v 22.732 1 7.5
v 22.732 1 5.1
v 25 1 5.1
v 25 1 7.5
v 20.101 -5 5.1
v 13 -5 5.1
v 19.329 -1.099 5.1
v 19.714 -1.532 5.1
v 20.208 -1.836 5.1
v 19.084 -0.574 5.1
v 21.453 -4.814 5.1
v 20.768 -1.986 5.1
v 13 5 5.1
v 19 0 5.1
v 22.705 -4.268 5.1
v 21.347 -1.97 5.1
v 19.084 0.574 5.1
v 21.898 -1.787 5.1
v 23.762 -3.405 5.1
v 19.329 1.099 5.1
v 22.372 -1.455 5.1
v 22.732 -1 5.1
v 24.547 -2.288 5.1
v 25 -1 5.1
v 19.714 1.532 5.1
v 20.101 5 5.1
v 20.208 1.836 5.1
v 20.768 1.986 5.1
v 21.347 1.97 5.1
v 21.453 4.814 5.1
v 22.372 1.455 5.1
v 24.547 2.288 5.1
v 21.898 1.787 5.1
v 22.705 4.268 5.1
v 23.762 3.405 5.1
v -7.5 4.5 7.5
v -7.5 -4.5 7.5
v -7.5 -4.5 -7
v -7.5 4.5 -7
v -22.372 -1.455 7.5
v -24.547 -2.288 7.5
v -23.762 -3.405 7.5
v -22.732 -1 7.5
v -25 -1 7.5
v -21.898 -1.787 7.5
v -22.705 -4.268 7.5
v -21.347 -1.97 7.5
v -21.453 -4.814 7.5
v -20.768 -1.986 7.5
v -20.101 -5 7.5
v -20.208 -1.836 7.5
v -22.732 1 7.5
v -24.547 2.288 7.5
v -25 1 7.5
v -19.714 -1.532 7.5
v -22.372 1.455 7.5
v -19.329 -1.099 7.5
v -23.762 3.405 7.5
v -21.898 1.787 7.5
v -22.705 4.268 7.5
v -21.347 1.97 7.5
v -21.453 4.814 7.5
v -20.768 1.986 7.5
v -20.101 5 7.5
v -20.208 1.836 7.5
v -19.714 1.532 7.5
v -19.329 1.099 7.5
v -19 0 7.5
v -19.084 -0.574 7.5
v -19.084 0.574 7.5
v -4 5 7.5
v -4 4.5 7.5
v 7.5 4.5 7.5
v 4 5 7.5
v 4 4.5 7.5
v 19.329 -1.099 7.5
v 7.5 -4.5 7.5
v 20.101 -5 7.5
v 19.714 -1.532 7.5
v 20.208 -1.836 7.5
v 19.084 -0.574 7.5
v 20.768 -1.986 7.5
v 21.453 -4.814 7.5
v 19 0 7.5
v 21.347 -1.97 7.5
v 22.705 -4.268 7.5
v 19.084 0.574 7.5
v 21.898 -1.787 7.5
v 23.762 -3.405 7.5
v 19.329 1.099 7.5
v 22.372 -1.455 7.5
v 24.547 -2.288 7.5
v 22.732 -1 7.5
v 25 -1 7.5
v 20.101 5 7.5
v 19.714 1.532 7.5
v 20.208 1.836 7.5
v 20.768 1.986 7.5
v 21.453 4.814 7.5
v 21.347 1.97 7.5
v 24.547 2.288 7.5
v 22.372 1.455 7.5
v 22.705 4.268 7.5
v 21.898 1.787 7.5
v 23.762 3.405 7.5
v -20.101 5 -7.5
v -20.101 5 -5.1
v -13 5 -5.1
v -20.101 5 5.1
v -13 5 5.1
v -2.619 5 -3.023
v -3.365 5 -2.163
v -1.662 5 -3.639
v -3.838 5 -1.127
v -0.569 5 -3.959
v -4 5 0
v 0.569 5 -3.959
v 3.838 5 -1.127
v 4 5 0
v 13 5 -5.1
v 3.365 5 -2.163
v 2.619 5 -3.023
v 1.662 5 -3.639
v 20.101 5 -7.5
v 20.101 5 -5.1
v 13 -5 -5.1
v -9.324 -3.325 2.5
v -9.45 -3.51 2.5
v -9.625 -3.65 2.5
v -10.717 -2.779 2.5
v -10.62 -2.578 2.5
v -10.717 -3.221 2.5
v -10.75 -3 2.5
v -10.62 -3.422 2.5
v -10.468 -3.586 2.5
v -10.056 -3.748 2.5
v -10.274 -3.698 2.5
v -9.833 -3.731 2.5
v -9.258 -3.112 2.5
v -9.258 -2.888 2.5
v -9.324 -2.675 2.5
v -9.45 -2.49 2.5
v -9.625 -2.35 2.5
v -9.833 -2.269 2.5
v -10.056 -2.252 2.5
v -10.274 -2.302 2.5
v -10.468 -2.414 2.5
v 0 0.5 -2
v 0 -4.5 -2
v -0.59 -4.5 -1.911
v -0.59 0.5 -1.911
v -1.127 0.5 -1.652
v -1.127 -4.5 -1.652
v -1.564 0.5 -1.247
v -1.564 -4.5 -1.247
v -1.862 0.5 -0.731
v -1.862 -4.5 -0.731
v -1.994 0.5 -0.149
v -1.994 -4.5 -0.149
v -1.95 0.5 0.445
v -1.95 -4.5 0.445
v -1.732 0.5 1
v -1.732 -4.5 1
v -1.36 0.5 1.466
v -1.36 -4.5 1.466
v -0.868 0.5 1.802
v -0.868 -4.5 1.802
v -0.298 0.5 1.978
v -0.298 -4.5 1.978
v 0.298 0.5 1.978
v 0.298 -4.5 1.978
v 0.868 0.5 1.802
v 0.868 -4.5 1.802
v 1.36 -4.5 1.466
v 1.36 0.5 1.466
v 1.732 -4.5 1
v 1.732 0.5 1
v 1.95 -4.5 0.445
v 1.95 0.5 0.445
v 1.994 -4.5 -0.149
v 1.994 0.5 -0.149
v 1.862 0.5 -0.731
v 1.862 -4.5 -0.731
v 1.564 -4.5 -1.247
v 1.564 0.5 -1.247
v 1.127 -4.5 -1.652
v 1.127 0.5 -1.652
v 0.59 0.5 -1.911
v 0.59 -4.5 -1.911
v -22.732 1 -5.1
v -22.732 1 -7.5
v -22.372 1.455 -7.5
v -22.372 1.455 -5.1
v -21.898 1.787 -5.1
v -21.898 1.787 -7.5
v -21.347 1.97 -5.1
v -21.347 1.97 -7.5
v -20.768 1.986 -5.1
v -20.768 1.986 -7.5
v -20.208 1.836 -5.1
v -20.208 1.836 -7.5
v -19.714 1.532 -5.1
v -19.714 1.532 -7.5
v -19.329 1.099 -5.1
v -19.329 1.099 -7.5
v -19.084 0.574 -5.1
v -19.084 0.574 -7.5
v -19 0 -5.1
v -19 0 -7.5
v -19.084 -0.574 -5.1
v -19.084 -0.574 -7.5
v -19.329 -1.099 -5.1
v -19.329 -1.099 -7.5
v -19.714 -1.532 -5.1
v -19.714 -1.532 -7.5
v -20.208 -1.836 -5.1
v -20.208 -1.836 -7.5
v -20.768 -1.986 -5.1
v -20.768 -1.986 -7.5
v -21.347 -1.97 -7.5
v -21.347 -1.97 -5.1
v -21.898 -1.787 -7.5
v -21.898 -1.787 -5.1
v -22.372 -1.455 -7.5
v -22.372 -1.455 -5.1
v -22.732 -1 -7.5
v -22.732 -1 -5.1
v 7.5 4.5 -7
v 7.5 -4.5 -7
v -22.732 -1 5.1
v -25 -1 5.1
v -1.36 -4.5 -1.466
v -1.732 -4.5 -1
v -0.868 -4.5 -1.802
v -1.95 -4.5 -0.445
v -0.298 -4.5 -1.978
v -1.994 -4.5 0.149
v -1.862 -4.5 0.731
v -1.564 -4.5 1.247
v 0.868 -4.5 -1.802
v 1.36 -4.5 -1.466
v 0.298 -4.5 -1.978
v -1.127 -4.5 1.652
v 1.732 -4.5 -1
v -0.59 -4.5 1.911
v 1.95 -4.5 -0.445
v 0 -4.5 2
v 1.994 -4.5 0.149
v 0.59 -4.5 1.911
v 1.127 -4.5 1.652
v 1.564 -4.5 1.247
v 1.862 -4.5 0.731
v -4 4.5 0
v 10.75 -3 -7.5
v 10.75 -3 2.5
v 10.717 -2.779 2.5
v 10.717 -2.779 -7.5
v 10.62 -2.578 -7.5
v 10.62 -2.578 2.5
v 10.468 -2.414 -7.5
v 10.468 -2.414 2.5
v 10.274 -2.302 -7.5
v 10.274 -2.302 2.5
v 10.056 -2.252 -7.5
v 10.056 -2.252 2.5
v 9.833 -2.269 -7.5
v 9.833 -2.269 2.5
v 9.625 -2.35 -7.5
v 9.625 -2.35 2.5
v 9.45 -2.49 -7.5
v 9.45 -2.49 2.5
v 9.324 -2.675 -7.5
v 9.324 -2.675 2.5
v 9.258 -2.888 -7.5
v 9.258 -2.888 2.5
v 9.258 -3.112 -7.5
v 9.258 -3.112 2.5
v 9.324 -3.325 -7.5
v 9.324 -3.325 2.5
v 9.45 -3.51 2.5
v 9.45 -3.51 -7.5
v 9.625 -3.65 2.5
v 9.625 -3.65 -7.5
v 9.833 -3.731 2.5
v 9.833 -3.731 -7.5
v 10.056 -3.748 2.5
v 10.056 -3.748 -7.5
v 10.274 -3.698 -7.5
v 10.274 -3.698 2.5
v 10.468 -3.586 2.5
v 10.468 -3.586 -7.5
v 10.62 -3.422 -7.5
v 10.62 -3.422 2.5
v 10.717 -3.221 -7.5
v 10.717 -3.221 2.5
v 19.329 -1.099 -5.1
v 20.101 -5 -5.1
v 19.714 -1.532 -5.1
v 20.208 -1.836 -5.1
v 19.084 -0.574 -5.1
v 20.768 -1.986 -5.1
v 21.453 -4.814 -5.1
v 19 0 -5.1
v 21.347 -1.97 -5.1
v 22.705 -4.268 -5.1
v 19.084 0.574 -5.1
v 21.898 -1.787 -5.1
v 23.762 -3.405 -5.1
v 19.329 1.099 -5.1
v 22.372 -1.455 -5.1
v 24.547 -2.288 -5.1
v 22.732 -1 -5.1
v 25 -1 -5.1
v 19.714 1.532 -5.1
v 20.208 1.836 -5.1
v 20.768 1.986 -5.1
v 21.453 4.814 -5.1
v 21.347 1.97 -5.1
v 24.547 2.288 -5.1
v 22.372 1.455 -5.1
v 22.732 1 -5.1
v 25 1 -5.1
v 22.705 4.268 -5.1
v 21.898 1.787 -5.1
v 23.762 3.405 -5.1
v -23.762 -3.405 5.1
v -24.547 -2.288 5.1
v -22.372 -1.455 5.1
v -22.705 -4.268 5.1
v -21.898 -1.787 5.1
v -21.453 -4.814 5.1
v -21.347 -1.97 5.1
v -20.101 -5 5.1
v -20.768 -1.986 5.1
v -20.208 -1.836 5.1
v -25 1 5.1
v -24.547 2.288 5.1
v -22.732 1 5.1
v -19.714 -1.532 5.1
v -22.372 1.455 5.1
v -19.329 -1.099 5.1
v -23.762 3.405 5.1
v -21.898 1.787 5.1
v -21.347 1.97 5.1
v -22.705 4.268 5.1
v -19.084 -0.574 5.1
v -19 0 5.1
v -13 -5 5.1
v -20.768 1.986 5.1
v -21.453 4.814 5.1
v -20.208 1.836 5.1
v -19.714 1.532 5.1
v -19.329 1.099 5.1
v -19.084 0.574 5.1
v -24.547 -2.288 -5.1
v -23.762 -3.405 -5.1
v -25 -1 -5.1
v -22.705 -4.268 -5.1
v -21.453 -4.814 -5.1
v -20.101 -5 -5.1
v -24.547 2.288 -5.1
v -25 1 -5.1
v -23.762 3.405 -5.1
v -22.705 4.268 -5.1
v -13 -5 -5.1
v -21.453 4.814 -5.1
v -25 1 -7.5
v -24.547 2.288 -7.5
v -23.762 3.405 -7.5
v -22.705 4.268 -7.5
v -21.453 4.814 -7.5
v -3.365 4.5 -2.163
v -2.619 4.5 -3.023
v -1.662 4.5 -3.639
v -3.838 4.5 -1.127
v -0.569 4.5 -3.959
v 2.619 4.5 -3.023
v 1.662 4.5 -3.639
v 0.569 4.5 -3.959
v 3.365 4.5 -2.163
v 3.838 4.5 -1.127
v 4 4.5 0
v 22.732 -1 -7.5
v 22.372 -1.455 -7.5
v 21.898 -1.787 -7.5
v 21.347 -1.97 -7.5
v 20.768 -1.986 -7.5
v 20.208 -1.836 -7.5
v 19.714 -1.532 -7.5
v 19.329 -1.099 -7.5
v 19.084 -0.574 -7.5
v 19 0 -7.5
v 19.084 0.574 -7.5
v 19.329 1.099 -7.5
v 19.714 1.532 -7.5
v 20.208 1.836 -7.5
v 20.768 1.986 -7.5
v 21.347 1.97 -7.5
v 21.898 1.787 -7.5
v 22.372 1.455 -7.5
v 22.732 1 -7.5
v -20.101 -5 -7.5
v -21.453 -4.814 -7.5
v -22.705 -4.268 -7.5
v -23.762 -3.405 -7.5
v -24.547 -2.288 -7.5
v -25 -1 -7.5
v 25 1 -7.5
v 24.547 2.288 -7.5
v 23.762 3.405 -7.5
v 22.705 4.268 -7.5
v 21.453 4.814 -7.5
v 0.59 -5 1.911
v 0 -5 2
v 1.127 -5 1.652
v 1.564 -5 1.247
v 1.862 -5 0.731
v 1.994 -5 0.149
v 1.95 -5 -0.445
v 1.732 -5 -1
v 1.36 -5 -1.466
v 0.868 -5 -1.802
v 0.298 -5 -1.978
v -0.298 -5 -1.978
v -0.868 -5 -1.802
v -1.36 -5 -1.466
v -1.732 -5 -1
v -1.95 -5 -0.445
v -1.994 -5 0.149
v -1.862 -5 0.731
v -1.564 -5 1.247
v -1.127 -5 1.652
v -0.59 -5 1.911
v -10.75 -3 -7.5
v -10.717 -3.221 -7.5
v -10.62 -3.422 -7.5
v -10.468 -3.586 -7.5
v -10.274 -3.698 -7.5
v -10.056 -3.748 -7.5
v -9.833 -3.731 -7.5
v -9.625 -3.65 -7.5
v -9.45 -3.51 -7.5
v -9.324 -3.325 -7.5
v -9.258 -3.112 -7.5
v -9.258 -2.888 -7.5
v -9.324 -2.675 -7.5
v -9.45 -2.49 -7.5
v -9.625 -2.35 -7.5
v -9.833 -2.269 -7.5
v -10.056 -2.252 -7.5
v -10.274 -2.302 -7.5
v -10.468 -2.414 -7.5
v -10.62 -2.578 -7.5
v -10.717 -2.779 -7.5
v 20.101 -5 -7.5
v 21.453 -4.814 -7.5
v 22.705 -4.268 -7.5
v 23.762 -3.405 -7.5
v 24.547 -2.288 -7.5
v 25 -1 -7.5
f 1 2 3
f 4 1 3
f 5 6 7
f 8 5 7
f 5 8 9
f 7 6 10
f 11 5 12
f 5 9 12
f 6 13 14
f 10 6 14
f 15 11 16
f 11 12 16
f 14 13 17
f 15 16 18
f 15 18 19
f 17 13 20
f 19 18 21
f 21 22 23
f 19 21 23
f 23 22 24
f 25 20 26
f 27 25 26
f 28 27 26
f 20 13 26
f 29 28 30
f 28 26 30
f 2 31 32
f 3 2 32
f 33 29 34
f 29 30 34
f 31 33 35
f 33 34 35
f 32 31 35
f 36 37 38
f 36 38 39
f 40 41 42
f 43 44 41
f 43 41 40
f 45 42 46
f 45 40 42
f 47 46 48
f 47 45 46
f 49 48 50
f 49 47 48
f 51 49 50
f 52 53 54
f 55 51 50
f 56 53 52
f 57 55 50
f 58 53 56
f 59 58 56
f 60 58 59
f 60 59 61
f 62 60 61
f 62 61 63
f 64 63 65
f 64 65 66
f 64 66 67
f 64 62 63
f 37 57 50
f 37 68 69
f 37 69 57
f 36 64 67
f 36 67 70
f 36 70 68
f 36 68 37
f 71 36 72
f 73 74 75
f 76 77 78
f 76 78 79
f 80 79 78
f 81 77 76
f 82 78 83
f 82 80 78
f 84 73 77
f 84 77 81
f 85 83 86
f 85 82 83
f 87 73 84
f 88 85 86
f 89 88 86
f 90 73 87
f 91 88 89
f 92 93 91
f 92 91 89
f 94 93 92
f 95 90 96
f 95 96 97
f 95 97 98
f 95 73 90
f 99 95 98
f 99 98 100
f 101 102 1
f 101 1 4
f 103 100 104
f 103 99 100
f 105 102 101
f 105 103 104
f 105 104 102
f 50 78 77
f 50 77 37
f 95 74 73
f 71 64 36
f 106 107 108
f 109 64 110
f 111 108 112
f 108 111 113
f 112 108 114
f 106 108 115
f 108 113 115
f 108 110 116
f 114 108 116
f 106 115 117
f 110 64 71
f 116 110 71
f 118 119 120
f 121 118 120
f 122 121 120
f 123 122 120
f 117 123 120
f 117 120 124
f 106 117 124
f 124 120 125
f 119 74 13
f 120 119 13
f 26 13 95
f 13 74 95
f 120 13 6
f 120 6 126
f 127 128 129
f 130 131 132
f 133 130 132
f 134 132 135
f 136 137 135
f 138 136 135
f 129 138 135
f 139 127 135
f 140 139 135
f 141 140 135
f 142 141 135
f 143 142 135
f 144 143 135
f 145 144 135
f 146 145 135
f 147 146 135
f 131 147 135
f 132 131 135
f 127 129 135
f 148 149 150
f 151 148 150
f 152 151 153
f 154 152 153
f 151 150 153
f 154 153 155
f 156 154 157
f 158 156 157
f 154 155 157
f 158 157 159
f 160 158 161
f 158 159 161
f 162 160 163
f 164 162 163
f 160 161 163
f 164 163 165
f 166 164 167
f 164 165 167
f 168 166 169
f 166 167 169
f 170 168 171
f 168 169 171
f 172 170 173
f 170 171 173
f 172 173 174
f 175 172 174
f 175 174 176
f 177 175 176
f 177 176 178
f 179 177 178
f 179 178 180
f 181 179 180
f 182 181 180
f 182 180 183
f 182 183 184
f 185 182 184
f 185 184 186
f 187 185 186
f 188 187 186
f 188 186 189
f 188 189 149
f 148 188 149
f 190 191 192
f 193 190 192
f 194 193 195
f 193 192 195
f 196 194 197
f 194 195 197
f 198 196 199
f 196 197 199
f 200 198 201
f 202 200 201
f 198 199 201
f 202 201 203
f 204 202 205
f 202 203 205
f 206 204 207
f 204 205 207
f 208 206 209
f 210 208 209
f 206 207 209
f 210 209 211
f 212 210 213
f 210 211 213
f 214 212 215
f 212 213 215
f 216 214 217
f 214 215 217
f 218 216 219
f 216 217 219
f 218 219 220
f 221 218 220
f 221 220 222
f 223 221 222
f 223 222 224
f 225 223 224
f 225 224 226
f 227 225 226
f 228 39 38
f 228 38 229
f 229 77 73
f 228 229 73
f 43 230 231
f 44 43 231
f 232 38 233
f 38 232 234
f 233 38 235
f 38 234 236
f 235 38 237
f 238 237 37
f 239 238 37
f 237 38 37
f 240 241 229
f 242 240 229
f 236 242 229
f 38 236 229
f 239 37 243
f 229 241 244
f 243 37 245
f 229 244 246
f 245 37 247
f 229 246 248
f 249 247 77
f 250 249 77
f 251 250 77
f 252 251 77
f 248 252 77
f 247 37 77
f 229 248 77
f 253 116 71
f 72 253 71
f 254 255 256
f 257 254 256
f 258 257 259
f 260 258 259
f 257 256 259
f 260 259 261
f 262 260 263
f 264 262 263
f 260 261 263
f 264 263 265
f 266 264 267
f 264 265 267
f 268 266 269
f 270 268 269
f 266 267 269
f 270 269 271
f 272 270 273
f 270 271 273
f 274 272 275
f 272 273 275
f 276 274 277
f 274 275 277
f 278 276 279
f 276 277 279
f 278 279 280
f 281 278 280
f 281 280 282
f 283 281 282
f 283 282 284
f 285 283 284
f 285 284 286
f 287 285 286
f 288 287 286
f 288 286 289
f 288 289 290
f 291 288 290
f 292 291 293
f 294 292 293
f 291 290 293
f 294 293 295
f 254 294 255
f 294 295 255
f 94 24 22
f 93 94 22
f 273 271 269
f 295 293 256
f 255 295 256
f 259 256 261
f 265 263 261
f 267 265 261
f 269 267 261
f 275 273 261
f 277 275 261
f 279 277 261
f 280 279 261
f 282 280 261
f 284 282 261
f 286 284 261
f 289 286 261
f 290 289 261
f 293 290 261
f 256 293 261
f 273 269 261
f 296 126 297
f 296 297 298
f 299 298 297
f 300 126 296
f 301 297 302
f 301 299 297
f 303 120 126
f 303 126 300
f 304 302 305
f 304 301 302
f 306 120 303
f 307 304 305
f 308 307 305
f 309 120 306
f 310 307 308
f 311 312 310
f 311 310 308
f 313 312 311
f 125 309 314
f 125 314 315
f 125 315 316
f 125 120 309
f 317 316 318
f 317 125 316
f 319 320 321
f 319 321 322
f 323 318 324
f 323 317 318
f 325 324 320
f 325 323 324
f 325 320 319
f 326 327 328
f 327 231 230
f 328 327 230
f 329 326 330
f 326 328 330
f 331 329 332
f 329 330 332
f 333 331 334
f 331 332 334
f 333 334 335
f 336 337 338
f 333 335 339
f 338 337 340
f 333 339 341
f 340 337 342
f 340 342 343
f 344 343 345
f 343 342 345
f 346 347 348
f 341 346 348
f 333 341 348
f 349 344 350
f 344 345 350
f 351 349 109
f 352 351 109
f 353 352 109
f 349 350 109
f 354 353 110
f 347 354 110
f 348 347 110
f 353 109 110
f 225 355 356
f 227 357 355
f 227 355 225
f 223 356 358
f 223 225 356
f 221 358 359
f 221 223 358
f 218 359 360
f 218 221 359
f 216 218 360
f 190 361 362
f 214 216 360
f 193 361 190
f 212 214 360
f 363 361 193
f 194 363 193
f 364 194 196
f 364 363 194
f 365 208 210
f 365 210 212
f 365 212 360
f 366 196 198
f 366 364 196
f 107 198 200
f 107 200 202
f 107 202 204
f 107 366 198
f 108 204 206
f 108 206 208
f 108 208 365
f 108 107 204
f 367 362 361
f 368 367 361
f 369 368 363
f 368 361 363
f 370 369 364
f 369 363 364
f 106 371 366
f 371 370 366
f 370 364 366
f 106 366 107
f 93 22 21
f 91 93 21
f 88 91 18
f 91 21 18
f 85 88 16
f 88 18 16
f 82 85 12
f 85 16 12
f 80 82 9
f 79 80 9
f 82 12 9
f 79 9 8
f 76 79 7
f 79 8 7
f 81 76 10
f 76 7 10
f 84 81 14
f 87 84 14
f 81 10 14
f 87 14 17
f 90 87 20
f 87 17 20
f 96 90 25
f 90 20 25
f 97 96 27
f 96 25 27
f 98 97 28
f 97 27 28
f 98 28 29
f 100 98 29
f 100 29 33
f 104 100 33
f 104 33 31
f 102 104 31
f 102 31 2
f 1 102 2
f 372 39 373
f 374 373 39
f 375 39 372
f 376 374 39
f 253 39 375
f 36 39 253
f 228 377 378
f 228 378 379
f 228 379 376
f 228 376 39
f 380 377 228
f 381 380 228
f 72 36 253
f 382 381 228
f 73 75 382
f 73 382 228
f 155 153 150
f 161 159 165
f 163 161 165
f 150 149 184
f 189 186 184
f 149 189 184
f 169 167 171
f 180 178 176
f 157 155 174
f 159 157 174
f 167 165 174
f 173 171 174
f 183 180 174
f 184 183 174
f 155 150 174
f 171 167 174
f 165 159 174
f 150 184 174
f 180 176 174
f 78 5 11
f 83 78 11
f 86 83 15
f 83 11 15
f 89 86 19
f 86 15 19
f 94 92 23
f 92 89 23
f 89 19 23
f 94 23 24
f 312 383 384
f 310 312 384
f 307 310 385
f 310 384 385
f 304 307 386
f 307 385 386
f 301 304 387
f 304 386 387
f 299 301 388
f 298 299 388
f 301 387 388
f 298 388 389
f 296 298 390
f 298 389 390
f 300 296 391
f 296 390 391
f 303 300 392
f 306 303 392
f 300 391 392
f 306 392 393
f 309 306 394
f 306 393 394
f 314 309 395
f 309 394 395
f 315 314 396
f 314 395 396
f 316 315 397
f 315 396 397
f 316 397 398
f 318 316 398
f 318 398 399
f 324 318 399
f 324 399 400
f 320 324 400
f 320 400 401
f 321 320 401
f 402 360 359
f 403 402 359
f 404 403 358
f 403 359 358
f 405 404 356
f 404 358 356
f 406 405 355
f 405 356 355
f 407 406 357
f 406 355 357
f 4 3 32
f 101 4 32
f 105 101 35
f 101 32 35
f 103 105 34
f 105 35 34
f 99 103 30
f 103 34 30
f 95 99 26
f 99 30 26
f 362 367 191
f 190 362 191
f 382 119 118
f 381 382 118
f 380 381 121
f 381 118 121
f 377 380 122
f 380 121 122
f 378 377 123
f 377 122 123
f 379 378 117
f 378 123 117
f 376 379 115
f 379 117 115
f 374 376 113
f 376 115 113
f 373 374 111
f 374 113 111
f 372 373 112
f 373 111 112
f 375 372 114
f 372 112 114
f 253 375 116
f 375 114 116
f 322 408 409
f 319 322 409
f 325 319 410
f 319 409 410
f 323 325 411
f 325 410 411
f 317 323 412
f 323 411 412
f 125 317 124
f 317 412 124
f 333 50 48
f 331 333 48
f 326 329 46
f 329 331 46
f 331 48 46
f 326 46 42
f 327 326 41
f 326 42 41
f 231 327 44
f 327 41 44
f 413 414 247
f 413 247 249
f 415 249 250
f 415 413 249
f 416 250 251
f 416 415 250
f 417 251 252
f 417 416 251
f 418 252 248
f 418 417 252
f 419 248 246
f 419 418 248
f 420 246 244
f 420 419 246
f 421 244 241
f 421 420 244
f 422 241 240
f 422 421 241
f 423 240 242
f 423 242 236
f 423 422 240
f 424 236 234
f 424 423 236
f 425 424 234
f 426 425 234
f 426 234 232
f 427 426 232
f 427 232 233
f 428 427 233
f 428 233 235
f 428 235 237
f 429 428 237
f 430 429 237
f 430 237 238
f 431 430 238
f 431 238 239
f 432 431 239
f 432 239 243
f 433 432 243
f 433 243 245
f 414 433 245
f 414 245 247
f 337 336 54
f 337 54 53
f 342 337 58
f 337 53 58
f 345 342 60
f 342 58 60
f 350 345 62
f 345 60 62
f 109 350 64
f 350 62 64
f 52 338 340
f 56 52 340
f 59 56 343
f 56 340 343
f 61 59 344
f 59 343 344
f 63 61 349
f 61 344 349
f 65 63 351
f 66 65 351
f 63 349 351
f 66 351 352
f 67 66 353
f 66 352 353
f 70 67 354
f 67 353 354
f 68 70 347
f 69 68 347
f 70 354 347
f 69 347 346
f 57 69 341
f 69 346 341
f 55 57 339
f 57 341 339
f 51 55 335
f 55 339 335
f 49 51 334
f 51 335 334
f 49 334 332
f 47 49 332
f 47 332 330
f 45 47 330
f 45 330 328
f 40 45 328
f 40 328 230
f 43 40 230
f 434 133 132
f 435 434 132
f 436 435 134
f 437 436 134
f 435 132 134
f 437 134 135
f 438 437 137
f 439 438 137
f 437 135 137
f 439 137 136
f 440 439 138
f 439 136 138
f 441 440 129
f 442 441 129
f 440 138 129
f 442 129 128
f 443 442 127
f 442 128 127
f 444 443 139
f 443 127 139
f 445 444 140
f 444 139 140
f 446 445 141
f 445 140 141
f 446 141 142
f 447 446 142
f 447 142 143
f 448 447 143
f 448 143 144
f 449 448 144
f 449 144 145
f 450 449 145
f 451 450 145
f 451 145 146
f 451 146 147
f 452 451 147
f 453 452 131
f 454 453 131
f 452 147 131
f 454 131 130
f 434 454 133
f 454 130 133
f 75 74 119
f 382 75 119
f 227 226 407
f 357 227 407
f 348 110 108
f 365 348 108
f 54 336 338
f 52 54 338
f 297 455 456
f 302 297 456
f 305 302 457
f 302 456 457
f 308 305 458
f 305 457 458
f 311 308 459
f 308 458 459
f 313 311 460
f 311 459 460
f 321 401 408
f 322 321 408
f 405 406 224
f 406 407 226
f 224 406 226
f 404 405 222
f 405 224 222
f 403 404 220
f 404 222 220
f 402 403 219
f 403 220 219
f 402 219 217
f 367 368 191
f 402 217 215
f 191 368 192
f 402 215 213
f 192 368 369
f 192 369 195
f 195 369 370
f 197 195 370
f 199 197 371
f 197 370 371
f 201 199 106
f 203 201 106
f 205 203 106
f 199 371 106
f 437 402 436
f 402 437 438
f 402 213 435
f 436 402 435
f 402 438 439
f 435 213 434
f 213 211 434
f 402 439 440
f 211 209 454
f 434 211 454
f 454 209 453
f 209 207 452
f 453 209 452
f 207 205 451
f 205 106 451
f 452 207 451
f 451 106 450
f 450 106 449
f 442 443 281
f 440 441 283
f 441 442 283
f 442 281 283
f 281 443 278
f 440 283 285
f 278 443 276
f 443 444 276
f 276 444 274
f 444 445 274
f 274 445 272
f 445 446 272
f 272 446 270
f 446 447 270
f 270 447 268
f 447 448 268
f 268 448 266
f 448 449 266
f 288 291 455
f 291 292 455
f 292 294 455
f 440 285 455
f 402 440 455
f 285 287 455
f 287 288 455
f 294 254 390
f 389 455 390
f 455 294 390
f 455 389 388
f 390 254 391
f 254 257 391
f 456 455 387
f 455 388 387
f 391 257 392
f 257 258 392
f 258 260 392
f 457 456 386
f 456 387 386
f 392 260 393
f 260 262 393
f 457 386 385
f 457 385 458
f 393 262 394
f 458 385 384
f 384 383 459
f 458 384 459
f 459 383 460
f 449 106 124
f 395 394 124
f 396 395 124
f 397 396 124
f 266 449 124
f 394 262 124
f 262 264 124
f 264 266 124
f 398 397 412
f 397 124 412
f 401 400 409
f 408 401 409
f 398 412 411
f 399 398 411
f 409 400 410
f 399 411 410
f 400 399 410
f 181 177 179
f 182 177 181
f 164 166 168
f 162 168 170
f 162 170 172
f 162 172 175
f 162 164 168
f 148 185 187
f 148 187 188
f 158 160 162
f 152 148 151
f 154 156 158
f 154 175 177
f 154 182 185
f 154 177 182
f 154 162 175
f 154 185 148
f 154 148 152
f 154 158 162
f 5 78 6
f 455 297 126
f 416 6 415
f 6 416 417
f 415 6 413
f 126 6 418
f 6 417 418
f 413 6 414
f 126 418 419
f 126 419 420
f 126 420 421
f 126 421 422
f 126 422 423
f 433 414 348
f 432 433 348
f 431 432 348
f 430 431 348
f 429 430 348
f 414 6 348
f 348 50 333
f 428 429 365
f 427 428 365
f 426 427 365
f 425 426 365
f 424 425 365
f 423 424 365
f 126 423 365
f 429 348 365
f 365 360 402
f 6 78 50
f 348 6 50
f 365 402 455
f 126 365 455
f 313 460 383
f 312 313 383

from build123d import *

# Parameters (mm, degrees)
SKETCH_1_W               = 50
SKETCH_1_H               = 10
EXTRUDE_1_DEPTH          = 7.5
CUT_EXTRUDE_1_DEPTH      = 6
SKETCH_4_W               = 15
SKETCH_4_H               = 9
CUT_EXTRUDE_2_DEPTH      = 14.5
SKETCH_5_R               = 2
EXTRUDE_2_DEPTH          = 5
SKETCH_6_W               = 12
SKETCH_6_H               = 10.2
CUT_EXTRUDE_3_DEPTH      = 28.950849719
CUT_EXTRUDE_4_DEPTH      = 30.580398915
CUT_EXTRUDE_4_DEPTH_BACK = 30.580398915
FILLET_1_R               = 5
CUT_EXTRUDE_START        = -5
SKETCH_8_R               = 0.75
CUT_EXTRUDE_5_DEPTH      = 10
EXTRUDE_START            = -0.5
SKETCH_5_2_R             = 2
EXTRUDE_1_2_DEPTH        = 0.5
CUT_EXTRUDE_START_2      = -10
SKETCH_5_3_R             = 2
CUT_EXTRUDE_1_2_DEPTH    = 10


with BuildPart() as part:
    # 草图1 → Extrude 1 (new, symmetric)
    with BuildSketch(Plane.XY):
        Rectangle(SKETCH_1_W, SKETCH_1_H)
    extrude(amount=EXTRUDE_1_DEPTH, both=True)

    # 草图3 → Cut-Extrude 1 (cut)
    with BuildSketch(Plane(origin=(0, 5, 0), x_dir=(1, 0, 0), z_dir=(0, 1, 0))):
        with BuildLine():
            Line((-4, 0), (-4, -11.498876283))
            Line((-4, -11.498876283), (4, -11.498876283))
            Line((4, -11.498876283), (4, 0))
            ThreePointArc((4, 0), (0, 4), (-4, 0))
        make_face()
    extrude(amount=-CUT_EXTRUDE_1_DEPTH, mode=Mode.SUBTRACT)

    # 草图4 → 切除-拉伸2 (cut)
    with BuildSketch(Plane.XY.offset(7.5)):
        Rectangle(SKETCH_4_W, SKETCH_4_H)
    extrude(amount=-CUT_EXTRUDE_2_DEPTH, mode=Mode.SUBTRACT)

    # 草图5 → 凸台-拉伸2 (add)
    with BuildSketch(Plane(origin=(0, -4.5, 0), x_dir=(1, 0, 0), z_dir=(0, 1, 0))):
        with Locations(Location((0, 0, 0), (0, 0, 90))):
            Circle(SKETCH_5_R)
    extrude(amount=EXTRUDE_2_DEPTH)

    # 草图6 → 切除-拉伸3 (cut, through all)
    with BuildSketch(Plane(origin=(0, 5, 0), x_dir=(1, 0, 0), z_dir=(0, 1, 0))):
        with Locations((-19, 0)):
            Rectangle(SKETCH_6_W, SKETCH_6_H)
        with Locations((19, 0)):
            Rectangle(SKETCH_6_W, SKETCH_6_H)
    extrude(amount=-CUT_EXTRUDE_3_DEPTH, mode=Mode.SUBTRACT)

    # 草图7 → 切除-拉伸4 (cut, two sides: drawn at the far end of the back side and taken through both)
    with BuildSketch(Plane.XY.offset(7.5).offset(-CUT_EXTRUDE_4_DEPTH_BACK)):
        with BuildLine():
            Line((-25, 1), (-22.732050808, 1))
            ThreePointArc((-22.732050808, 1), (-19, 0), (-22.732050808, -1))
            Line((-22.732050808, -1), (-25, -1))
            Line((-25, -1), (-25, 1))
        make_face()
        with BuildLine():
            Line((25, -1), (22.732050808, -1))
            ThreePointArc((22.732050808, -1), (19, 0), (22.732050808, 1))
            Line((22.732050808, 1), (25, 1))
            Line((25, 1), (25, -1))
        make_face()
    extrude(amount=CUT_EXTRUDE_4_DEPTH + CUT_EXTRUDE_4_DEPTH_BACK, mode=Mode.SUBTRACT)

    # 圆角1
    # the kernel refuses this fillet: 5 mm, written as the material it takes off along each edge
    with BuildSketch(Plane(origin=(25, 5, -19.747448714), x_dir=(-1, 0, 0), z_dir=(0, 0, 1)), Plane(origin=(25, 5, -7.147448714), x_dir=(-1, 0, 0), z_dir=(0, 0, 1)), Plane(origin=(-25, 5, 7.147448714), x_dir=(1, 0, 0), z_dir=(0, 0, -1)), Plane(origin=(-25, 5, 19.747448714), x_dir=(1, 0, 0), z_dir=(0, 0, -1))) as fillet_1_piece_1:
        with BuildLine():
            CenterArc((4.898979486, 5), FILLET_1_R, 191.536959033, 78.463040967)
            Line((0, 4), (-0.09797959, 3.98))
            ThreePointArc((-0.09797959, 3.98), (-0.1, 2), (-0.1, 0))
            Line((-0.1, 0), (0, -0.1))
            Line((0, -0.1), (4.898979486, -0.1))
            Line((4.898979486, -0.1), (4.898979486, 0))
        make_face()
    extrude(amount=26.894897428, mode=Mode.SUBTRACT)
    with BuildSketch(Plane(origin=(25, -5, -19.747448714), x_dir=(-1, 0, 0), z_dir=(0, 0, 1)), Plane(origin=(25, -5, -7.147448714), x_dir=(-1, 0, 0), z_dir=(0, 0, 1)), Plane(origin=(-25, -5, 7.147448714), x_dir=(1, 0, 0), z_dir=(0, 0, -1)), Plane(origin=(-25, -5, 19.747448714), x_dir=(1, 0, 0), z_dir=(0, 0, -1))) as fillet_1_piece_2:
        with BuildLine():
            CenterArc((4.898979486, -5), FILLET_1_R, 90, 78.463040967)
            Line((0, -4), (-0.09797959, -3.98))
            ThreePointArc((-0.09797959, -3.98), (-0.1, -2), (-0.1, 0))
            Line((-0.1, 0), (0, 0.1))
            Line((0, 0.1), (4.898979486, 0.1))
            Line((4.898979486, 0.1), (4.898979486, 0))
        make_face()
    extrude(amount=26.894897428, mode=Mode.SUBTRACT)

    # 草图8 → 切除-拉伸5 (cut)
    with BuildSketch(Plane.XY.offset(7.5).offset(CUT_EXTRUDE_START)):
        with Locations((10, -3)):
            Circle(SKETCH_8_R)
        with Locations(Location((-10, -3, 0), (0, 0, 180))):
            Circle(SKETCH_8_R)
    extrude(amount=-CUT_EXTRUDE_5_DEPTH, mode=Mode.SUBTRACT)

    # 草图5<2> → Extrude 1 2 (add)
    with BuildSketch(Plane(origin=(0, -4.5, 0), x_dir=(1, 0, 0), z_dir=(0, 1, 0)).offset(EXTRUDE_START)):
        with Locations(Location((0, 0, 0), (0, 0, 90))):
            Circle(SKETCH_5_2_R)
    extrude(amount=EXTRUDE_1_2_DEPTH)

    # 草图5<3> → Cut-Extrude 1 2 (cut)
    with BuildSketch(Plane(origin=(0, -4.5, 0), x_dir=(1, 0, 0), z_dir=(0, 1, 0)).offset(CUT_EXTRUDE_START_2)):
        with Locations(Location((0, 0, 0), (0, 0, 270))):
            Circle(SKETCH_5_3_R)
    extrude(amount=CUT_EXTRUDE_1_2_DEPTH, mode=Mode.SUBTRACT)


with BuildPart() as cut_extrude_1_2_piece_1:
    # of the separate pieces the step leaves, piece 1, a body of its own (cut_extrude_1_2_pieces)
    add(part.part.solids().sort_by_distance((-13, -5, -5.1))[0])


with BuildPart() as cut_extrude_1_2_piece_2:
    # of the separate pieces the step leaves, piece 2, a body of its own (cut_extrude_1_2_pieces)
    add(part.part.solids().sort_by_distance((0, 0.5, -2))[0])


solid = Compound([cut_extrude_1_2_piece_1.part, cut_extrude_1_2_piece_2.part])
